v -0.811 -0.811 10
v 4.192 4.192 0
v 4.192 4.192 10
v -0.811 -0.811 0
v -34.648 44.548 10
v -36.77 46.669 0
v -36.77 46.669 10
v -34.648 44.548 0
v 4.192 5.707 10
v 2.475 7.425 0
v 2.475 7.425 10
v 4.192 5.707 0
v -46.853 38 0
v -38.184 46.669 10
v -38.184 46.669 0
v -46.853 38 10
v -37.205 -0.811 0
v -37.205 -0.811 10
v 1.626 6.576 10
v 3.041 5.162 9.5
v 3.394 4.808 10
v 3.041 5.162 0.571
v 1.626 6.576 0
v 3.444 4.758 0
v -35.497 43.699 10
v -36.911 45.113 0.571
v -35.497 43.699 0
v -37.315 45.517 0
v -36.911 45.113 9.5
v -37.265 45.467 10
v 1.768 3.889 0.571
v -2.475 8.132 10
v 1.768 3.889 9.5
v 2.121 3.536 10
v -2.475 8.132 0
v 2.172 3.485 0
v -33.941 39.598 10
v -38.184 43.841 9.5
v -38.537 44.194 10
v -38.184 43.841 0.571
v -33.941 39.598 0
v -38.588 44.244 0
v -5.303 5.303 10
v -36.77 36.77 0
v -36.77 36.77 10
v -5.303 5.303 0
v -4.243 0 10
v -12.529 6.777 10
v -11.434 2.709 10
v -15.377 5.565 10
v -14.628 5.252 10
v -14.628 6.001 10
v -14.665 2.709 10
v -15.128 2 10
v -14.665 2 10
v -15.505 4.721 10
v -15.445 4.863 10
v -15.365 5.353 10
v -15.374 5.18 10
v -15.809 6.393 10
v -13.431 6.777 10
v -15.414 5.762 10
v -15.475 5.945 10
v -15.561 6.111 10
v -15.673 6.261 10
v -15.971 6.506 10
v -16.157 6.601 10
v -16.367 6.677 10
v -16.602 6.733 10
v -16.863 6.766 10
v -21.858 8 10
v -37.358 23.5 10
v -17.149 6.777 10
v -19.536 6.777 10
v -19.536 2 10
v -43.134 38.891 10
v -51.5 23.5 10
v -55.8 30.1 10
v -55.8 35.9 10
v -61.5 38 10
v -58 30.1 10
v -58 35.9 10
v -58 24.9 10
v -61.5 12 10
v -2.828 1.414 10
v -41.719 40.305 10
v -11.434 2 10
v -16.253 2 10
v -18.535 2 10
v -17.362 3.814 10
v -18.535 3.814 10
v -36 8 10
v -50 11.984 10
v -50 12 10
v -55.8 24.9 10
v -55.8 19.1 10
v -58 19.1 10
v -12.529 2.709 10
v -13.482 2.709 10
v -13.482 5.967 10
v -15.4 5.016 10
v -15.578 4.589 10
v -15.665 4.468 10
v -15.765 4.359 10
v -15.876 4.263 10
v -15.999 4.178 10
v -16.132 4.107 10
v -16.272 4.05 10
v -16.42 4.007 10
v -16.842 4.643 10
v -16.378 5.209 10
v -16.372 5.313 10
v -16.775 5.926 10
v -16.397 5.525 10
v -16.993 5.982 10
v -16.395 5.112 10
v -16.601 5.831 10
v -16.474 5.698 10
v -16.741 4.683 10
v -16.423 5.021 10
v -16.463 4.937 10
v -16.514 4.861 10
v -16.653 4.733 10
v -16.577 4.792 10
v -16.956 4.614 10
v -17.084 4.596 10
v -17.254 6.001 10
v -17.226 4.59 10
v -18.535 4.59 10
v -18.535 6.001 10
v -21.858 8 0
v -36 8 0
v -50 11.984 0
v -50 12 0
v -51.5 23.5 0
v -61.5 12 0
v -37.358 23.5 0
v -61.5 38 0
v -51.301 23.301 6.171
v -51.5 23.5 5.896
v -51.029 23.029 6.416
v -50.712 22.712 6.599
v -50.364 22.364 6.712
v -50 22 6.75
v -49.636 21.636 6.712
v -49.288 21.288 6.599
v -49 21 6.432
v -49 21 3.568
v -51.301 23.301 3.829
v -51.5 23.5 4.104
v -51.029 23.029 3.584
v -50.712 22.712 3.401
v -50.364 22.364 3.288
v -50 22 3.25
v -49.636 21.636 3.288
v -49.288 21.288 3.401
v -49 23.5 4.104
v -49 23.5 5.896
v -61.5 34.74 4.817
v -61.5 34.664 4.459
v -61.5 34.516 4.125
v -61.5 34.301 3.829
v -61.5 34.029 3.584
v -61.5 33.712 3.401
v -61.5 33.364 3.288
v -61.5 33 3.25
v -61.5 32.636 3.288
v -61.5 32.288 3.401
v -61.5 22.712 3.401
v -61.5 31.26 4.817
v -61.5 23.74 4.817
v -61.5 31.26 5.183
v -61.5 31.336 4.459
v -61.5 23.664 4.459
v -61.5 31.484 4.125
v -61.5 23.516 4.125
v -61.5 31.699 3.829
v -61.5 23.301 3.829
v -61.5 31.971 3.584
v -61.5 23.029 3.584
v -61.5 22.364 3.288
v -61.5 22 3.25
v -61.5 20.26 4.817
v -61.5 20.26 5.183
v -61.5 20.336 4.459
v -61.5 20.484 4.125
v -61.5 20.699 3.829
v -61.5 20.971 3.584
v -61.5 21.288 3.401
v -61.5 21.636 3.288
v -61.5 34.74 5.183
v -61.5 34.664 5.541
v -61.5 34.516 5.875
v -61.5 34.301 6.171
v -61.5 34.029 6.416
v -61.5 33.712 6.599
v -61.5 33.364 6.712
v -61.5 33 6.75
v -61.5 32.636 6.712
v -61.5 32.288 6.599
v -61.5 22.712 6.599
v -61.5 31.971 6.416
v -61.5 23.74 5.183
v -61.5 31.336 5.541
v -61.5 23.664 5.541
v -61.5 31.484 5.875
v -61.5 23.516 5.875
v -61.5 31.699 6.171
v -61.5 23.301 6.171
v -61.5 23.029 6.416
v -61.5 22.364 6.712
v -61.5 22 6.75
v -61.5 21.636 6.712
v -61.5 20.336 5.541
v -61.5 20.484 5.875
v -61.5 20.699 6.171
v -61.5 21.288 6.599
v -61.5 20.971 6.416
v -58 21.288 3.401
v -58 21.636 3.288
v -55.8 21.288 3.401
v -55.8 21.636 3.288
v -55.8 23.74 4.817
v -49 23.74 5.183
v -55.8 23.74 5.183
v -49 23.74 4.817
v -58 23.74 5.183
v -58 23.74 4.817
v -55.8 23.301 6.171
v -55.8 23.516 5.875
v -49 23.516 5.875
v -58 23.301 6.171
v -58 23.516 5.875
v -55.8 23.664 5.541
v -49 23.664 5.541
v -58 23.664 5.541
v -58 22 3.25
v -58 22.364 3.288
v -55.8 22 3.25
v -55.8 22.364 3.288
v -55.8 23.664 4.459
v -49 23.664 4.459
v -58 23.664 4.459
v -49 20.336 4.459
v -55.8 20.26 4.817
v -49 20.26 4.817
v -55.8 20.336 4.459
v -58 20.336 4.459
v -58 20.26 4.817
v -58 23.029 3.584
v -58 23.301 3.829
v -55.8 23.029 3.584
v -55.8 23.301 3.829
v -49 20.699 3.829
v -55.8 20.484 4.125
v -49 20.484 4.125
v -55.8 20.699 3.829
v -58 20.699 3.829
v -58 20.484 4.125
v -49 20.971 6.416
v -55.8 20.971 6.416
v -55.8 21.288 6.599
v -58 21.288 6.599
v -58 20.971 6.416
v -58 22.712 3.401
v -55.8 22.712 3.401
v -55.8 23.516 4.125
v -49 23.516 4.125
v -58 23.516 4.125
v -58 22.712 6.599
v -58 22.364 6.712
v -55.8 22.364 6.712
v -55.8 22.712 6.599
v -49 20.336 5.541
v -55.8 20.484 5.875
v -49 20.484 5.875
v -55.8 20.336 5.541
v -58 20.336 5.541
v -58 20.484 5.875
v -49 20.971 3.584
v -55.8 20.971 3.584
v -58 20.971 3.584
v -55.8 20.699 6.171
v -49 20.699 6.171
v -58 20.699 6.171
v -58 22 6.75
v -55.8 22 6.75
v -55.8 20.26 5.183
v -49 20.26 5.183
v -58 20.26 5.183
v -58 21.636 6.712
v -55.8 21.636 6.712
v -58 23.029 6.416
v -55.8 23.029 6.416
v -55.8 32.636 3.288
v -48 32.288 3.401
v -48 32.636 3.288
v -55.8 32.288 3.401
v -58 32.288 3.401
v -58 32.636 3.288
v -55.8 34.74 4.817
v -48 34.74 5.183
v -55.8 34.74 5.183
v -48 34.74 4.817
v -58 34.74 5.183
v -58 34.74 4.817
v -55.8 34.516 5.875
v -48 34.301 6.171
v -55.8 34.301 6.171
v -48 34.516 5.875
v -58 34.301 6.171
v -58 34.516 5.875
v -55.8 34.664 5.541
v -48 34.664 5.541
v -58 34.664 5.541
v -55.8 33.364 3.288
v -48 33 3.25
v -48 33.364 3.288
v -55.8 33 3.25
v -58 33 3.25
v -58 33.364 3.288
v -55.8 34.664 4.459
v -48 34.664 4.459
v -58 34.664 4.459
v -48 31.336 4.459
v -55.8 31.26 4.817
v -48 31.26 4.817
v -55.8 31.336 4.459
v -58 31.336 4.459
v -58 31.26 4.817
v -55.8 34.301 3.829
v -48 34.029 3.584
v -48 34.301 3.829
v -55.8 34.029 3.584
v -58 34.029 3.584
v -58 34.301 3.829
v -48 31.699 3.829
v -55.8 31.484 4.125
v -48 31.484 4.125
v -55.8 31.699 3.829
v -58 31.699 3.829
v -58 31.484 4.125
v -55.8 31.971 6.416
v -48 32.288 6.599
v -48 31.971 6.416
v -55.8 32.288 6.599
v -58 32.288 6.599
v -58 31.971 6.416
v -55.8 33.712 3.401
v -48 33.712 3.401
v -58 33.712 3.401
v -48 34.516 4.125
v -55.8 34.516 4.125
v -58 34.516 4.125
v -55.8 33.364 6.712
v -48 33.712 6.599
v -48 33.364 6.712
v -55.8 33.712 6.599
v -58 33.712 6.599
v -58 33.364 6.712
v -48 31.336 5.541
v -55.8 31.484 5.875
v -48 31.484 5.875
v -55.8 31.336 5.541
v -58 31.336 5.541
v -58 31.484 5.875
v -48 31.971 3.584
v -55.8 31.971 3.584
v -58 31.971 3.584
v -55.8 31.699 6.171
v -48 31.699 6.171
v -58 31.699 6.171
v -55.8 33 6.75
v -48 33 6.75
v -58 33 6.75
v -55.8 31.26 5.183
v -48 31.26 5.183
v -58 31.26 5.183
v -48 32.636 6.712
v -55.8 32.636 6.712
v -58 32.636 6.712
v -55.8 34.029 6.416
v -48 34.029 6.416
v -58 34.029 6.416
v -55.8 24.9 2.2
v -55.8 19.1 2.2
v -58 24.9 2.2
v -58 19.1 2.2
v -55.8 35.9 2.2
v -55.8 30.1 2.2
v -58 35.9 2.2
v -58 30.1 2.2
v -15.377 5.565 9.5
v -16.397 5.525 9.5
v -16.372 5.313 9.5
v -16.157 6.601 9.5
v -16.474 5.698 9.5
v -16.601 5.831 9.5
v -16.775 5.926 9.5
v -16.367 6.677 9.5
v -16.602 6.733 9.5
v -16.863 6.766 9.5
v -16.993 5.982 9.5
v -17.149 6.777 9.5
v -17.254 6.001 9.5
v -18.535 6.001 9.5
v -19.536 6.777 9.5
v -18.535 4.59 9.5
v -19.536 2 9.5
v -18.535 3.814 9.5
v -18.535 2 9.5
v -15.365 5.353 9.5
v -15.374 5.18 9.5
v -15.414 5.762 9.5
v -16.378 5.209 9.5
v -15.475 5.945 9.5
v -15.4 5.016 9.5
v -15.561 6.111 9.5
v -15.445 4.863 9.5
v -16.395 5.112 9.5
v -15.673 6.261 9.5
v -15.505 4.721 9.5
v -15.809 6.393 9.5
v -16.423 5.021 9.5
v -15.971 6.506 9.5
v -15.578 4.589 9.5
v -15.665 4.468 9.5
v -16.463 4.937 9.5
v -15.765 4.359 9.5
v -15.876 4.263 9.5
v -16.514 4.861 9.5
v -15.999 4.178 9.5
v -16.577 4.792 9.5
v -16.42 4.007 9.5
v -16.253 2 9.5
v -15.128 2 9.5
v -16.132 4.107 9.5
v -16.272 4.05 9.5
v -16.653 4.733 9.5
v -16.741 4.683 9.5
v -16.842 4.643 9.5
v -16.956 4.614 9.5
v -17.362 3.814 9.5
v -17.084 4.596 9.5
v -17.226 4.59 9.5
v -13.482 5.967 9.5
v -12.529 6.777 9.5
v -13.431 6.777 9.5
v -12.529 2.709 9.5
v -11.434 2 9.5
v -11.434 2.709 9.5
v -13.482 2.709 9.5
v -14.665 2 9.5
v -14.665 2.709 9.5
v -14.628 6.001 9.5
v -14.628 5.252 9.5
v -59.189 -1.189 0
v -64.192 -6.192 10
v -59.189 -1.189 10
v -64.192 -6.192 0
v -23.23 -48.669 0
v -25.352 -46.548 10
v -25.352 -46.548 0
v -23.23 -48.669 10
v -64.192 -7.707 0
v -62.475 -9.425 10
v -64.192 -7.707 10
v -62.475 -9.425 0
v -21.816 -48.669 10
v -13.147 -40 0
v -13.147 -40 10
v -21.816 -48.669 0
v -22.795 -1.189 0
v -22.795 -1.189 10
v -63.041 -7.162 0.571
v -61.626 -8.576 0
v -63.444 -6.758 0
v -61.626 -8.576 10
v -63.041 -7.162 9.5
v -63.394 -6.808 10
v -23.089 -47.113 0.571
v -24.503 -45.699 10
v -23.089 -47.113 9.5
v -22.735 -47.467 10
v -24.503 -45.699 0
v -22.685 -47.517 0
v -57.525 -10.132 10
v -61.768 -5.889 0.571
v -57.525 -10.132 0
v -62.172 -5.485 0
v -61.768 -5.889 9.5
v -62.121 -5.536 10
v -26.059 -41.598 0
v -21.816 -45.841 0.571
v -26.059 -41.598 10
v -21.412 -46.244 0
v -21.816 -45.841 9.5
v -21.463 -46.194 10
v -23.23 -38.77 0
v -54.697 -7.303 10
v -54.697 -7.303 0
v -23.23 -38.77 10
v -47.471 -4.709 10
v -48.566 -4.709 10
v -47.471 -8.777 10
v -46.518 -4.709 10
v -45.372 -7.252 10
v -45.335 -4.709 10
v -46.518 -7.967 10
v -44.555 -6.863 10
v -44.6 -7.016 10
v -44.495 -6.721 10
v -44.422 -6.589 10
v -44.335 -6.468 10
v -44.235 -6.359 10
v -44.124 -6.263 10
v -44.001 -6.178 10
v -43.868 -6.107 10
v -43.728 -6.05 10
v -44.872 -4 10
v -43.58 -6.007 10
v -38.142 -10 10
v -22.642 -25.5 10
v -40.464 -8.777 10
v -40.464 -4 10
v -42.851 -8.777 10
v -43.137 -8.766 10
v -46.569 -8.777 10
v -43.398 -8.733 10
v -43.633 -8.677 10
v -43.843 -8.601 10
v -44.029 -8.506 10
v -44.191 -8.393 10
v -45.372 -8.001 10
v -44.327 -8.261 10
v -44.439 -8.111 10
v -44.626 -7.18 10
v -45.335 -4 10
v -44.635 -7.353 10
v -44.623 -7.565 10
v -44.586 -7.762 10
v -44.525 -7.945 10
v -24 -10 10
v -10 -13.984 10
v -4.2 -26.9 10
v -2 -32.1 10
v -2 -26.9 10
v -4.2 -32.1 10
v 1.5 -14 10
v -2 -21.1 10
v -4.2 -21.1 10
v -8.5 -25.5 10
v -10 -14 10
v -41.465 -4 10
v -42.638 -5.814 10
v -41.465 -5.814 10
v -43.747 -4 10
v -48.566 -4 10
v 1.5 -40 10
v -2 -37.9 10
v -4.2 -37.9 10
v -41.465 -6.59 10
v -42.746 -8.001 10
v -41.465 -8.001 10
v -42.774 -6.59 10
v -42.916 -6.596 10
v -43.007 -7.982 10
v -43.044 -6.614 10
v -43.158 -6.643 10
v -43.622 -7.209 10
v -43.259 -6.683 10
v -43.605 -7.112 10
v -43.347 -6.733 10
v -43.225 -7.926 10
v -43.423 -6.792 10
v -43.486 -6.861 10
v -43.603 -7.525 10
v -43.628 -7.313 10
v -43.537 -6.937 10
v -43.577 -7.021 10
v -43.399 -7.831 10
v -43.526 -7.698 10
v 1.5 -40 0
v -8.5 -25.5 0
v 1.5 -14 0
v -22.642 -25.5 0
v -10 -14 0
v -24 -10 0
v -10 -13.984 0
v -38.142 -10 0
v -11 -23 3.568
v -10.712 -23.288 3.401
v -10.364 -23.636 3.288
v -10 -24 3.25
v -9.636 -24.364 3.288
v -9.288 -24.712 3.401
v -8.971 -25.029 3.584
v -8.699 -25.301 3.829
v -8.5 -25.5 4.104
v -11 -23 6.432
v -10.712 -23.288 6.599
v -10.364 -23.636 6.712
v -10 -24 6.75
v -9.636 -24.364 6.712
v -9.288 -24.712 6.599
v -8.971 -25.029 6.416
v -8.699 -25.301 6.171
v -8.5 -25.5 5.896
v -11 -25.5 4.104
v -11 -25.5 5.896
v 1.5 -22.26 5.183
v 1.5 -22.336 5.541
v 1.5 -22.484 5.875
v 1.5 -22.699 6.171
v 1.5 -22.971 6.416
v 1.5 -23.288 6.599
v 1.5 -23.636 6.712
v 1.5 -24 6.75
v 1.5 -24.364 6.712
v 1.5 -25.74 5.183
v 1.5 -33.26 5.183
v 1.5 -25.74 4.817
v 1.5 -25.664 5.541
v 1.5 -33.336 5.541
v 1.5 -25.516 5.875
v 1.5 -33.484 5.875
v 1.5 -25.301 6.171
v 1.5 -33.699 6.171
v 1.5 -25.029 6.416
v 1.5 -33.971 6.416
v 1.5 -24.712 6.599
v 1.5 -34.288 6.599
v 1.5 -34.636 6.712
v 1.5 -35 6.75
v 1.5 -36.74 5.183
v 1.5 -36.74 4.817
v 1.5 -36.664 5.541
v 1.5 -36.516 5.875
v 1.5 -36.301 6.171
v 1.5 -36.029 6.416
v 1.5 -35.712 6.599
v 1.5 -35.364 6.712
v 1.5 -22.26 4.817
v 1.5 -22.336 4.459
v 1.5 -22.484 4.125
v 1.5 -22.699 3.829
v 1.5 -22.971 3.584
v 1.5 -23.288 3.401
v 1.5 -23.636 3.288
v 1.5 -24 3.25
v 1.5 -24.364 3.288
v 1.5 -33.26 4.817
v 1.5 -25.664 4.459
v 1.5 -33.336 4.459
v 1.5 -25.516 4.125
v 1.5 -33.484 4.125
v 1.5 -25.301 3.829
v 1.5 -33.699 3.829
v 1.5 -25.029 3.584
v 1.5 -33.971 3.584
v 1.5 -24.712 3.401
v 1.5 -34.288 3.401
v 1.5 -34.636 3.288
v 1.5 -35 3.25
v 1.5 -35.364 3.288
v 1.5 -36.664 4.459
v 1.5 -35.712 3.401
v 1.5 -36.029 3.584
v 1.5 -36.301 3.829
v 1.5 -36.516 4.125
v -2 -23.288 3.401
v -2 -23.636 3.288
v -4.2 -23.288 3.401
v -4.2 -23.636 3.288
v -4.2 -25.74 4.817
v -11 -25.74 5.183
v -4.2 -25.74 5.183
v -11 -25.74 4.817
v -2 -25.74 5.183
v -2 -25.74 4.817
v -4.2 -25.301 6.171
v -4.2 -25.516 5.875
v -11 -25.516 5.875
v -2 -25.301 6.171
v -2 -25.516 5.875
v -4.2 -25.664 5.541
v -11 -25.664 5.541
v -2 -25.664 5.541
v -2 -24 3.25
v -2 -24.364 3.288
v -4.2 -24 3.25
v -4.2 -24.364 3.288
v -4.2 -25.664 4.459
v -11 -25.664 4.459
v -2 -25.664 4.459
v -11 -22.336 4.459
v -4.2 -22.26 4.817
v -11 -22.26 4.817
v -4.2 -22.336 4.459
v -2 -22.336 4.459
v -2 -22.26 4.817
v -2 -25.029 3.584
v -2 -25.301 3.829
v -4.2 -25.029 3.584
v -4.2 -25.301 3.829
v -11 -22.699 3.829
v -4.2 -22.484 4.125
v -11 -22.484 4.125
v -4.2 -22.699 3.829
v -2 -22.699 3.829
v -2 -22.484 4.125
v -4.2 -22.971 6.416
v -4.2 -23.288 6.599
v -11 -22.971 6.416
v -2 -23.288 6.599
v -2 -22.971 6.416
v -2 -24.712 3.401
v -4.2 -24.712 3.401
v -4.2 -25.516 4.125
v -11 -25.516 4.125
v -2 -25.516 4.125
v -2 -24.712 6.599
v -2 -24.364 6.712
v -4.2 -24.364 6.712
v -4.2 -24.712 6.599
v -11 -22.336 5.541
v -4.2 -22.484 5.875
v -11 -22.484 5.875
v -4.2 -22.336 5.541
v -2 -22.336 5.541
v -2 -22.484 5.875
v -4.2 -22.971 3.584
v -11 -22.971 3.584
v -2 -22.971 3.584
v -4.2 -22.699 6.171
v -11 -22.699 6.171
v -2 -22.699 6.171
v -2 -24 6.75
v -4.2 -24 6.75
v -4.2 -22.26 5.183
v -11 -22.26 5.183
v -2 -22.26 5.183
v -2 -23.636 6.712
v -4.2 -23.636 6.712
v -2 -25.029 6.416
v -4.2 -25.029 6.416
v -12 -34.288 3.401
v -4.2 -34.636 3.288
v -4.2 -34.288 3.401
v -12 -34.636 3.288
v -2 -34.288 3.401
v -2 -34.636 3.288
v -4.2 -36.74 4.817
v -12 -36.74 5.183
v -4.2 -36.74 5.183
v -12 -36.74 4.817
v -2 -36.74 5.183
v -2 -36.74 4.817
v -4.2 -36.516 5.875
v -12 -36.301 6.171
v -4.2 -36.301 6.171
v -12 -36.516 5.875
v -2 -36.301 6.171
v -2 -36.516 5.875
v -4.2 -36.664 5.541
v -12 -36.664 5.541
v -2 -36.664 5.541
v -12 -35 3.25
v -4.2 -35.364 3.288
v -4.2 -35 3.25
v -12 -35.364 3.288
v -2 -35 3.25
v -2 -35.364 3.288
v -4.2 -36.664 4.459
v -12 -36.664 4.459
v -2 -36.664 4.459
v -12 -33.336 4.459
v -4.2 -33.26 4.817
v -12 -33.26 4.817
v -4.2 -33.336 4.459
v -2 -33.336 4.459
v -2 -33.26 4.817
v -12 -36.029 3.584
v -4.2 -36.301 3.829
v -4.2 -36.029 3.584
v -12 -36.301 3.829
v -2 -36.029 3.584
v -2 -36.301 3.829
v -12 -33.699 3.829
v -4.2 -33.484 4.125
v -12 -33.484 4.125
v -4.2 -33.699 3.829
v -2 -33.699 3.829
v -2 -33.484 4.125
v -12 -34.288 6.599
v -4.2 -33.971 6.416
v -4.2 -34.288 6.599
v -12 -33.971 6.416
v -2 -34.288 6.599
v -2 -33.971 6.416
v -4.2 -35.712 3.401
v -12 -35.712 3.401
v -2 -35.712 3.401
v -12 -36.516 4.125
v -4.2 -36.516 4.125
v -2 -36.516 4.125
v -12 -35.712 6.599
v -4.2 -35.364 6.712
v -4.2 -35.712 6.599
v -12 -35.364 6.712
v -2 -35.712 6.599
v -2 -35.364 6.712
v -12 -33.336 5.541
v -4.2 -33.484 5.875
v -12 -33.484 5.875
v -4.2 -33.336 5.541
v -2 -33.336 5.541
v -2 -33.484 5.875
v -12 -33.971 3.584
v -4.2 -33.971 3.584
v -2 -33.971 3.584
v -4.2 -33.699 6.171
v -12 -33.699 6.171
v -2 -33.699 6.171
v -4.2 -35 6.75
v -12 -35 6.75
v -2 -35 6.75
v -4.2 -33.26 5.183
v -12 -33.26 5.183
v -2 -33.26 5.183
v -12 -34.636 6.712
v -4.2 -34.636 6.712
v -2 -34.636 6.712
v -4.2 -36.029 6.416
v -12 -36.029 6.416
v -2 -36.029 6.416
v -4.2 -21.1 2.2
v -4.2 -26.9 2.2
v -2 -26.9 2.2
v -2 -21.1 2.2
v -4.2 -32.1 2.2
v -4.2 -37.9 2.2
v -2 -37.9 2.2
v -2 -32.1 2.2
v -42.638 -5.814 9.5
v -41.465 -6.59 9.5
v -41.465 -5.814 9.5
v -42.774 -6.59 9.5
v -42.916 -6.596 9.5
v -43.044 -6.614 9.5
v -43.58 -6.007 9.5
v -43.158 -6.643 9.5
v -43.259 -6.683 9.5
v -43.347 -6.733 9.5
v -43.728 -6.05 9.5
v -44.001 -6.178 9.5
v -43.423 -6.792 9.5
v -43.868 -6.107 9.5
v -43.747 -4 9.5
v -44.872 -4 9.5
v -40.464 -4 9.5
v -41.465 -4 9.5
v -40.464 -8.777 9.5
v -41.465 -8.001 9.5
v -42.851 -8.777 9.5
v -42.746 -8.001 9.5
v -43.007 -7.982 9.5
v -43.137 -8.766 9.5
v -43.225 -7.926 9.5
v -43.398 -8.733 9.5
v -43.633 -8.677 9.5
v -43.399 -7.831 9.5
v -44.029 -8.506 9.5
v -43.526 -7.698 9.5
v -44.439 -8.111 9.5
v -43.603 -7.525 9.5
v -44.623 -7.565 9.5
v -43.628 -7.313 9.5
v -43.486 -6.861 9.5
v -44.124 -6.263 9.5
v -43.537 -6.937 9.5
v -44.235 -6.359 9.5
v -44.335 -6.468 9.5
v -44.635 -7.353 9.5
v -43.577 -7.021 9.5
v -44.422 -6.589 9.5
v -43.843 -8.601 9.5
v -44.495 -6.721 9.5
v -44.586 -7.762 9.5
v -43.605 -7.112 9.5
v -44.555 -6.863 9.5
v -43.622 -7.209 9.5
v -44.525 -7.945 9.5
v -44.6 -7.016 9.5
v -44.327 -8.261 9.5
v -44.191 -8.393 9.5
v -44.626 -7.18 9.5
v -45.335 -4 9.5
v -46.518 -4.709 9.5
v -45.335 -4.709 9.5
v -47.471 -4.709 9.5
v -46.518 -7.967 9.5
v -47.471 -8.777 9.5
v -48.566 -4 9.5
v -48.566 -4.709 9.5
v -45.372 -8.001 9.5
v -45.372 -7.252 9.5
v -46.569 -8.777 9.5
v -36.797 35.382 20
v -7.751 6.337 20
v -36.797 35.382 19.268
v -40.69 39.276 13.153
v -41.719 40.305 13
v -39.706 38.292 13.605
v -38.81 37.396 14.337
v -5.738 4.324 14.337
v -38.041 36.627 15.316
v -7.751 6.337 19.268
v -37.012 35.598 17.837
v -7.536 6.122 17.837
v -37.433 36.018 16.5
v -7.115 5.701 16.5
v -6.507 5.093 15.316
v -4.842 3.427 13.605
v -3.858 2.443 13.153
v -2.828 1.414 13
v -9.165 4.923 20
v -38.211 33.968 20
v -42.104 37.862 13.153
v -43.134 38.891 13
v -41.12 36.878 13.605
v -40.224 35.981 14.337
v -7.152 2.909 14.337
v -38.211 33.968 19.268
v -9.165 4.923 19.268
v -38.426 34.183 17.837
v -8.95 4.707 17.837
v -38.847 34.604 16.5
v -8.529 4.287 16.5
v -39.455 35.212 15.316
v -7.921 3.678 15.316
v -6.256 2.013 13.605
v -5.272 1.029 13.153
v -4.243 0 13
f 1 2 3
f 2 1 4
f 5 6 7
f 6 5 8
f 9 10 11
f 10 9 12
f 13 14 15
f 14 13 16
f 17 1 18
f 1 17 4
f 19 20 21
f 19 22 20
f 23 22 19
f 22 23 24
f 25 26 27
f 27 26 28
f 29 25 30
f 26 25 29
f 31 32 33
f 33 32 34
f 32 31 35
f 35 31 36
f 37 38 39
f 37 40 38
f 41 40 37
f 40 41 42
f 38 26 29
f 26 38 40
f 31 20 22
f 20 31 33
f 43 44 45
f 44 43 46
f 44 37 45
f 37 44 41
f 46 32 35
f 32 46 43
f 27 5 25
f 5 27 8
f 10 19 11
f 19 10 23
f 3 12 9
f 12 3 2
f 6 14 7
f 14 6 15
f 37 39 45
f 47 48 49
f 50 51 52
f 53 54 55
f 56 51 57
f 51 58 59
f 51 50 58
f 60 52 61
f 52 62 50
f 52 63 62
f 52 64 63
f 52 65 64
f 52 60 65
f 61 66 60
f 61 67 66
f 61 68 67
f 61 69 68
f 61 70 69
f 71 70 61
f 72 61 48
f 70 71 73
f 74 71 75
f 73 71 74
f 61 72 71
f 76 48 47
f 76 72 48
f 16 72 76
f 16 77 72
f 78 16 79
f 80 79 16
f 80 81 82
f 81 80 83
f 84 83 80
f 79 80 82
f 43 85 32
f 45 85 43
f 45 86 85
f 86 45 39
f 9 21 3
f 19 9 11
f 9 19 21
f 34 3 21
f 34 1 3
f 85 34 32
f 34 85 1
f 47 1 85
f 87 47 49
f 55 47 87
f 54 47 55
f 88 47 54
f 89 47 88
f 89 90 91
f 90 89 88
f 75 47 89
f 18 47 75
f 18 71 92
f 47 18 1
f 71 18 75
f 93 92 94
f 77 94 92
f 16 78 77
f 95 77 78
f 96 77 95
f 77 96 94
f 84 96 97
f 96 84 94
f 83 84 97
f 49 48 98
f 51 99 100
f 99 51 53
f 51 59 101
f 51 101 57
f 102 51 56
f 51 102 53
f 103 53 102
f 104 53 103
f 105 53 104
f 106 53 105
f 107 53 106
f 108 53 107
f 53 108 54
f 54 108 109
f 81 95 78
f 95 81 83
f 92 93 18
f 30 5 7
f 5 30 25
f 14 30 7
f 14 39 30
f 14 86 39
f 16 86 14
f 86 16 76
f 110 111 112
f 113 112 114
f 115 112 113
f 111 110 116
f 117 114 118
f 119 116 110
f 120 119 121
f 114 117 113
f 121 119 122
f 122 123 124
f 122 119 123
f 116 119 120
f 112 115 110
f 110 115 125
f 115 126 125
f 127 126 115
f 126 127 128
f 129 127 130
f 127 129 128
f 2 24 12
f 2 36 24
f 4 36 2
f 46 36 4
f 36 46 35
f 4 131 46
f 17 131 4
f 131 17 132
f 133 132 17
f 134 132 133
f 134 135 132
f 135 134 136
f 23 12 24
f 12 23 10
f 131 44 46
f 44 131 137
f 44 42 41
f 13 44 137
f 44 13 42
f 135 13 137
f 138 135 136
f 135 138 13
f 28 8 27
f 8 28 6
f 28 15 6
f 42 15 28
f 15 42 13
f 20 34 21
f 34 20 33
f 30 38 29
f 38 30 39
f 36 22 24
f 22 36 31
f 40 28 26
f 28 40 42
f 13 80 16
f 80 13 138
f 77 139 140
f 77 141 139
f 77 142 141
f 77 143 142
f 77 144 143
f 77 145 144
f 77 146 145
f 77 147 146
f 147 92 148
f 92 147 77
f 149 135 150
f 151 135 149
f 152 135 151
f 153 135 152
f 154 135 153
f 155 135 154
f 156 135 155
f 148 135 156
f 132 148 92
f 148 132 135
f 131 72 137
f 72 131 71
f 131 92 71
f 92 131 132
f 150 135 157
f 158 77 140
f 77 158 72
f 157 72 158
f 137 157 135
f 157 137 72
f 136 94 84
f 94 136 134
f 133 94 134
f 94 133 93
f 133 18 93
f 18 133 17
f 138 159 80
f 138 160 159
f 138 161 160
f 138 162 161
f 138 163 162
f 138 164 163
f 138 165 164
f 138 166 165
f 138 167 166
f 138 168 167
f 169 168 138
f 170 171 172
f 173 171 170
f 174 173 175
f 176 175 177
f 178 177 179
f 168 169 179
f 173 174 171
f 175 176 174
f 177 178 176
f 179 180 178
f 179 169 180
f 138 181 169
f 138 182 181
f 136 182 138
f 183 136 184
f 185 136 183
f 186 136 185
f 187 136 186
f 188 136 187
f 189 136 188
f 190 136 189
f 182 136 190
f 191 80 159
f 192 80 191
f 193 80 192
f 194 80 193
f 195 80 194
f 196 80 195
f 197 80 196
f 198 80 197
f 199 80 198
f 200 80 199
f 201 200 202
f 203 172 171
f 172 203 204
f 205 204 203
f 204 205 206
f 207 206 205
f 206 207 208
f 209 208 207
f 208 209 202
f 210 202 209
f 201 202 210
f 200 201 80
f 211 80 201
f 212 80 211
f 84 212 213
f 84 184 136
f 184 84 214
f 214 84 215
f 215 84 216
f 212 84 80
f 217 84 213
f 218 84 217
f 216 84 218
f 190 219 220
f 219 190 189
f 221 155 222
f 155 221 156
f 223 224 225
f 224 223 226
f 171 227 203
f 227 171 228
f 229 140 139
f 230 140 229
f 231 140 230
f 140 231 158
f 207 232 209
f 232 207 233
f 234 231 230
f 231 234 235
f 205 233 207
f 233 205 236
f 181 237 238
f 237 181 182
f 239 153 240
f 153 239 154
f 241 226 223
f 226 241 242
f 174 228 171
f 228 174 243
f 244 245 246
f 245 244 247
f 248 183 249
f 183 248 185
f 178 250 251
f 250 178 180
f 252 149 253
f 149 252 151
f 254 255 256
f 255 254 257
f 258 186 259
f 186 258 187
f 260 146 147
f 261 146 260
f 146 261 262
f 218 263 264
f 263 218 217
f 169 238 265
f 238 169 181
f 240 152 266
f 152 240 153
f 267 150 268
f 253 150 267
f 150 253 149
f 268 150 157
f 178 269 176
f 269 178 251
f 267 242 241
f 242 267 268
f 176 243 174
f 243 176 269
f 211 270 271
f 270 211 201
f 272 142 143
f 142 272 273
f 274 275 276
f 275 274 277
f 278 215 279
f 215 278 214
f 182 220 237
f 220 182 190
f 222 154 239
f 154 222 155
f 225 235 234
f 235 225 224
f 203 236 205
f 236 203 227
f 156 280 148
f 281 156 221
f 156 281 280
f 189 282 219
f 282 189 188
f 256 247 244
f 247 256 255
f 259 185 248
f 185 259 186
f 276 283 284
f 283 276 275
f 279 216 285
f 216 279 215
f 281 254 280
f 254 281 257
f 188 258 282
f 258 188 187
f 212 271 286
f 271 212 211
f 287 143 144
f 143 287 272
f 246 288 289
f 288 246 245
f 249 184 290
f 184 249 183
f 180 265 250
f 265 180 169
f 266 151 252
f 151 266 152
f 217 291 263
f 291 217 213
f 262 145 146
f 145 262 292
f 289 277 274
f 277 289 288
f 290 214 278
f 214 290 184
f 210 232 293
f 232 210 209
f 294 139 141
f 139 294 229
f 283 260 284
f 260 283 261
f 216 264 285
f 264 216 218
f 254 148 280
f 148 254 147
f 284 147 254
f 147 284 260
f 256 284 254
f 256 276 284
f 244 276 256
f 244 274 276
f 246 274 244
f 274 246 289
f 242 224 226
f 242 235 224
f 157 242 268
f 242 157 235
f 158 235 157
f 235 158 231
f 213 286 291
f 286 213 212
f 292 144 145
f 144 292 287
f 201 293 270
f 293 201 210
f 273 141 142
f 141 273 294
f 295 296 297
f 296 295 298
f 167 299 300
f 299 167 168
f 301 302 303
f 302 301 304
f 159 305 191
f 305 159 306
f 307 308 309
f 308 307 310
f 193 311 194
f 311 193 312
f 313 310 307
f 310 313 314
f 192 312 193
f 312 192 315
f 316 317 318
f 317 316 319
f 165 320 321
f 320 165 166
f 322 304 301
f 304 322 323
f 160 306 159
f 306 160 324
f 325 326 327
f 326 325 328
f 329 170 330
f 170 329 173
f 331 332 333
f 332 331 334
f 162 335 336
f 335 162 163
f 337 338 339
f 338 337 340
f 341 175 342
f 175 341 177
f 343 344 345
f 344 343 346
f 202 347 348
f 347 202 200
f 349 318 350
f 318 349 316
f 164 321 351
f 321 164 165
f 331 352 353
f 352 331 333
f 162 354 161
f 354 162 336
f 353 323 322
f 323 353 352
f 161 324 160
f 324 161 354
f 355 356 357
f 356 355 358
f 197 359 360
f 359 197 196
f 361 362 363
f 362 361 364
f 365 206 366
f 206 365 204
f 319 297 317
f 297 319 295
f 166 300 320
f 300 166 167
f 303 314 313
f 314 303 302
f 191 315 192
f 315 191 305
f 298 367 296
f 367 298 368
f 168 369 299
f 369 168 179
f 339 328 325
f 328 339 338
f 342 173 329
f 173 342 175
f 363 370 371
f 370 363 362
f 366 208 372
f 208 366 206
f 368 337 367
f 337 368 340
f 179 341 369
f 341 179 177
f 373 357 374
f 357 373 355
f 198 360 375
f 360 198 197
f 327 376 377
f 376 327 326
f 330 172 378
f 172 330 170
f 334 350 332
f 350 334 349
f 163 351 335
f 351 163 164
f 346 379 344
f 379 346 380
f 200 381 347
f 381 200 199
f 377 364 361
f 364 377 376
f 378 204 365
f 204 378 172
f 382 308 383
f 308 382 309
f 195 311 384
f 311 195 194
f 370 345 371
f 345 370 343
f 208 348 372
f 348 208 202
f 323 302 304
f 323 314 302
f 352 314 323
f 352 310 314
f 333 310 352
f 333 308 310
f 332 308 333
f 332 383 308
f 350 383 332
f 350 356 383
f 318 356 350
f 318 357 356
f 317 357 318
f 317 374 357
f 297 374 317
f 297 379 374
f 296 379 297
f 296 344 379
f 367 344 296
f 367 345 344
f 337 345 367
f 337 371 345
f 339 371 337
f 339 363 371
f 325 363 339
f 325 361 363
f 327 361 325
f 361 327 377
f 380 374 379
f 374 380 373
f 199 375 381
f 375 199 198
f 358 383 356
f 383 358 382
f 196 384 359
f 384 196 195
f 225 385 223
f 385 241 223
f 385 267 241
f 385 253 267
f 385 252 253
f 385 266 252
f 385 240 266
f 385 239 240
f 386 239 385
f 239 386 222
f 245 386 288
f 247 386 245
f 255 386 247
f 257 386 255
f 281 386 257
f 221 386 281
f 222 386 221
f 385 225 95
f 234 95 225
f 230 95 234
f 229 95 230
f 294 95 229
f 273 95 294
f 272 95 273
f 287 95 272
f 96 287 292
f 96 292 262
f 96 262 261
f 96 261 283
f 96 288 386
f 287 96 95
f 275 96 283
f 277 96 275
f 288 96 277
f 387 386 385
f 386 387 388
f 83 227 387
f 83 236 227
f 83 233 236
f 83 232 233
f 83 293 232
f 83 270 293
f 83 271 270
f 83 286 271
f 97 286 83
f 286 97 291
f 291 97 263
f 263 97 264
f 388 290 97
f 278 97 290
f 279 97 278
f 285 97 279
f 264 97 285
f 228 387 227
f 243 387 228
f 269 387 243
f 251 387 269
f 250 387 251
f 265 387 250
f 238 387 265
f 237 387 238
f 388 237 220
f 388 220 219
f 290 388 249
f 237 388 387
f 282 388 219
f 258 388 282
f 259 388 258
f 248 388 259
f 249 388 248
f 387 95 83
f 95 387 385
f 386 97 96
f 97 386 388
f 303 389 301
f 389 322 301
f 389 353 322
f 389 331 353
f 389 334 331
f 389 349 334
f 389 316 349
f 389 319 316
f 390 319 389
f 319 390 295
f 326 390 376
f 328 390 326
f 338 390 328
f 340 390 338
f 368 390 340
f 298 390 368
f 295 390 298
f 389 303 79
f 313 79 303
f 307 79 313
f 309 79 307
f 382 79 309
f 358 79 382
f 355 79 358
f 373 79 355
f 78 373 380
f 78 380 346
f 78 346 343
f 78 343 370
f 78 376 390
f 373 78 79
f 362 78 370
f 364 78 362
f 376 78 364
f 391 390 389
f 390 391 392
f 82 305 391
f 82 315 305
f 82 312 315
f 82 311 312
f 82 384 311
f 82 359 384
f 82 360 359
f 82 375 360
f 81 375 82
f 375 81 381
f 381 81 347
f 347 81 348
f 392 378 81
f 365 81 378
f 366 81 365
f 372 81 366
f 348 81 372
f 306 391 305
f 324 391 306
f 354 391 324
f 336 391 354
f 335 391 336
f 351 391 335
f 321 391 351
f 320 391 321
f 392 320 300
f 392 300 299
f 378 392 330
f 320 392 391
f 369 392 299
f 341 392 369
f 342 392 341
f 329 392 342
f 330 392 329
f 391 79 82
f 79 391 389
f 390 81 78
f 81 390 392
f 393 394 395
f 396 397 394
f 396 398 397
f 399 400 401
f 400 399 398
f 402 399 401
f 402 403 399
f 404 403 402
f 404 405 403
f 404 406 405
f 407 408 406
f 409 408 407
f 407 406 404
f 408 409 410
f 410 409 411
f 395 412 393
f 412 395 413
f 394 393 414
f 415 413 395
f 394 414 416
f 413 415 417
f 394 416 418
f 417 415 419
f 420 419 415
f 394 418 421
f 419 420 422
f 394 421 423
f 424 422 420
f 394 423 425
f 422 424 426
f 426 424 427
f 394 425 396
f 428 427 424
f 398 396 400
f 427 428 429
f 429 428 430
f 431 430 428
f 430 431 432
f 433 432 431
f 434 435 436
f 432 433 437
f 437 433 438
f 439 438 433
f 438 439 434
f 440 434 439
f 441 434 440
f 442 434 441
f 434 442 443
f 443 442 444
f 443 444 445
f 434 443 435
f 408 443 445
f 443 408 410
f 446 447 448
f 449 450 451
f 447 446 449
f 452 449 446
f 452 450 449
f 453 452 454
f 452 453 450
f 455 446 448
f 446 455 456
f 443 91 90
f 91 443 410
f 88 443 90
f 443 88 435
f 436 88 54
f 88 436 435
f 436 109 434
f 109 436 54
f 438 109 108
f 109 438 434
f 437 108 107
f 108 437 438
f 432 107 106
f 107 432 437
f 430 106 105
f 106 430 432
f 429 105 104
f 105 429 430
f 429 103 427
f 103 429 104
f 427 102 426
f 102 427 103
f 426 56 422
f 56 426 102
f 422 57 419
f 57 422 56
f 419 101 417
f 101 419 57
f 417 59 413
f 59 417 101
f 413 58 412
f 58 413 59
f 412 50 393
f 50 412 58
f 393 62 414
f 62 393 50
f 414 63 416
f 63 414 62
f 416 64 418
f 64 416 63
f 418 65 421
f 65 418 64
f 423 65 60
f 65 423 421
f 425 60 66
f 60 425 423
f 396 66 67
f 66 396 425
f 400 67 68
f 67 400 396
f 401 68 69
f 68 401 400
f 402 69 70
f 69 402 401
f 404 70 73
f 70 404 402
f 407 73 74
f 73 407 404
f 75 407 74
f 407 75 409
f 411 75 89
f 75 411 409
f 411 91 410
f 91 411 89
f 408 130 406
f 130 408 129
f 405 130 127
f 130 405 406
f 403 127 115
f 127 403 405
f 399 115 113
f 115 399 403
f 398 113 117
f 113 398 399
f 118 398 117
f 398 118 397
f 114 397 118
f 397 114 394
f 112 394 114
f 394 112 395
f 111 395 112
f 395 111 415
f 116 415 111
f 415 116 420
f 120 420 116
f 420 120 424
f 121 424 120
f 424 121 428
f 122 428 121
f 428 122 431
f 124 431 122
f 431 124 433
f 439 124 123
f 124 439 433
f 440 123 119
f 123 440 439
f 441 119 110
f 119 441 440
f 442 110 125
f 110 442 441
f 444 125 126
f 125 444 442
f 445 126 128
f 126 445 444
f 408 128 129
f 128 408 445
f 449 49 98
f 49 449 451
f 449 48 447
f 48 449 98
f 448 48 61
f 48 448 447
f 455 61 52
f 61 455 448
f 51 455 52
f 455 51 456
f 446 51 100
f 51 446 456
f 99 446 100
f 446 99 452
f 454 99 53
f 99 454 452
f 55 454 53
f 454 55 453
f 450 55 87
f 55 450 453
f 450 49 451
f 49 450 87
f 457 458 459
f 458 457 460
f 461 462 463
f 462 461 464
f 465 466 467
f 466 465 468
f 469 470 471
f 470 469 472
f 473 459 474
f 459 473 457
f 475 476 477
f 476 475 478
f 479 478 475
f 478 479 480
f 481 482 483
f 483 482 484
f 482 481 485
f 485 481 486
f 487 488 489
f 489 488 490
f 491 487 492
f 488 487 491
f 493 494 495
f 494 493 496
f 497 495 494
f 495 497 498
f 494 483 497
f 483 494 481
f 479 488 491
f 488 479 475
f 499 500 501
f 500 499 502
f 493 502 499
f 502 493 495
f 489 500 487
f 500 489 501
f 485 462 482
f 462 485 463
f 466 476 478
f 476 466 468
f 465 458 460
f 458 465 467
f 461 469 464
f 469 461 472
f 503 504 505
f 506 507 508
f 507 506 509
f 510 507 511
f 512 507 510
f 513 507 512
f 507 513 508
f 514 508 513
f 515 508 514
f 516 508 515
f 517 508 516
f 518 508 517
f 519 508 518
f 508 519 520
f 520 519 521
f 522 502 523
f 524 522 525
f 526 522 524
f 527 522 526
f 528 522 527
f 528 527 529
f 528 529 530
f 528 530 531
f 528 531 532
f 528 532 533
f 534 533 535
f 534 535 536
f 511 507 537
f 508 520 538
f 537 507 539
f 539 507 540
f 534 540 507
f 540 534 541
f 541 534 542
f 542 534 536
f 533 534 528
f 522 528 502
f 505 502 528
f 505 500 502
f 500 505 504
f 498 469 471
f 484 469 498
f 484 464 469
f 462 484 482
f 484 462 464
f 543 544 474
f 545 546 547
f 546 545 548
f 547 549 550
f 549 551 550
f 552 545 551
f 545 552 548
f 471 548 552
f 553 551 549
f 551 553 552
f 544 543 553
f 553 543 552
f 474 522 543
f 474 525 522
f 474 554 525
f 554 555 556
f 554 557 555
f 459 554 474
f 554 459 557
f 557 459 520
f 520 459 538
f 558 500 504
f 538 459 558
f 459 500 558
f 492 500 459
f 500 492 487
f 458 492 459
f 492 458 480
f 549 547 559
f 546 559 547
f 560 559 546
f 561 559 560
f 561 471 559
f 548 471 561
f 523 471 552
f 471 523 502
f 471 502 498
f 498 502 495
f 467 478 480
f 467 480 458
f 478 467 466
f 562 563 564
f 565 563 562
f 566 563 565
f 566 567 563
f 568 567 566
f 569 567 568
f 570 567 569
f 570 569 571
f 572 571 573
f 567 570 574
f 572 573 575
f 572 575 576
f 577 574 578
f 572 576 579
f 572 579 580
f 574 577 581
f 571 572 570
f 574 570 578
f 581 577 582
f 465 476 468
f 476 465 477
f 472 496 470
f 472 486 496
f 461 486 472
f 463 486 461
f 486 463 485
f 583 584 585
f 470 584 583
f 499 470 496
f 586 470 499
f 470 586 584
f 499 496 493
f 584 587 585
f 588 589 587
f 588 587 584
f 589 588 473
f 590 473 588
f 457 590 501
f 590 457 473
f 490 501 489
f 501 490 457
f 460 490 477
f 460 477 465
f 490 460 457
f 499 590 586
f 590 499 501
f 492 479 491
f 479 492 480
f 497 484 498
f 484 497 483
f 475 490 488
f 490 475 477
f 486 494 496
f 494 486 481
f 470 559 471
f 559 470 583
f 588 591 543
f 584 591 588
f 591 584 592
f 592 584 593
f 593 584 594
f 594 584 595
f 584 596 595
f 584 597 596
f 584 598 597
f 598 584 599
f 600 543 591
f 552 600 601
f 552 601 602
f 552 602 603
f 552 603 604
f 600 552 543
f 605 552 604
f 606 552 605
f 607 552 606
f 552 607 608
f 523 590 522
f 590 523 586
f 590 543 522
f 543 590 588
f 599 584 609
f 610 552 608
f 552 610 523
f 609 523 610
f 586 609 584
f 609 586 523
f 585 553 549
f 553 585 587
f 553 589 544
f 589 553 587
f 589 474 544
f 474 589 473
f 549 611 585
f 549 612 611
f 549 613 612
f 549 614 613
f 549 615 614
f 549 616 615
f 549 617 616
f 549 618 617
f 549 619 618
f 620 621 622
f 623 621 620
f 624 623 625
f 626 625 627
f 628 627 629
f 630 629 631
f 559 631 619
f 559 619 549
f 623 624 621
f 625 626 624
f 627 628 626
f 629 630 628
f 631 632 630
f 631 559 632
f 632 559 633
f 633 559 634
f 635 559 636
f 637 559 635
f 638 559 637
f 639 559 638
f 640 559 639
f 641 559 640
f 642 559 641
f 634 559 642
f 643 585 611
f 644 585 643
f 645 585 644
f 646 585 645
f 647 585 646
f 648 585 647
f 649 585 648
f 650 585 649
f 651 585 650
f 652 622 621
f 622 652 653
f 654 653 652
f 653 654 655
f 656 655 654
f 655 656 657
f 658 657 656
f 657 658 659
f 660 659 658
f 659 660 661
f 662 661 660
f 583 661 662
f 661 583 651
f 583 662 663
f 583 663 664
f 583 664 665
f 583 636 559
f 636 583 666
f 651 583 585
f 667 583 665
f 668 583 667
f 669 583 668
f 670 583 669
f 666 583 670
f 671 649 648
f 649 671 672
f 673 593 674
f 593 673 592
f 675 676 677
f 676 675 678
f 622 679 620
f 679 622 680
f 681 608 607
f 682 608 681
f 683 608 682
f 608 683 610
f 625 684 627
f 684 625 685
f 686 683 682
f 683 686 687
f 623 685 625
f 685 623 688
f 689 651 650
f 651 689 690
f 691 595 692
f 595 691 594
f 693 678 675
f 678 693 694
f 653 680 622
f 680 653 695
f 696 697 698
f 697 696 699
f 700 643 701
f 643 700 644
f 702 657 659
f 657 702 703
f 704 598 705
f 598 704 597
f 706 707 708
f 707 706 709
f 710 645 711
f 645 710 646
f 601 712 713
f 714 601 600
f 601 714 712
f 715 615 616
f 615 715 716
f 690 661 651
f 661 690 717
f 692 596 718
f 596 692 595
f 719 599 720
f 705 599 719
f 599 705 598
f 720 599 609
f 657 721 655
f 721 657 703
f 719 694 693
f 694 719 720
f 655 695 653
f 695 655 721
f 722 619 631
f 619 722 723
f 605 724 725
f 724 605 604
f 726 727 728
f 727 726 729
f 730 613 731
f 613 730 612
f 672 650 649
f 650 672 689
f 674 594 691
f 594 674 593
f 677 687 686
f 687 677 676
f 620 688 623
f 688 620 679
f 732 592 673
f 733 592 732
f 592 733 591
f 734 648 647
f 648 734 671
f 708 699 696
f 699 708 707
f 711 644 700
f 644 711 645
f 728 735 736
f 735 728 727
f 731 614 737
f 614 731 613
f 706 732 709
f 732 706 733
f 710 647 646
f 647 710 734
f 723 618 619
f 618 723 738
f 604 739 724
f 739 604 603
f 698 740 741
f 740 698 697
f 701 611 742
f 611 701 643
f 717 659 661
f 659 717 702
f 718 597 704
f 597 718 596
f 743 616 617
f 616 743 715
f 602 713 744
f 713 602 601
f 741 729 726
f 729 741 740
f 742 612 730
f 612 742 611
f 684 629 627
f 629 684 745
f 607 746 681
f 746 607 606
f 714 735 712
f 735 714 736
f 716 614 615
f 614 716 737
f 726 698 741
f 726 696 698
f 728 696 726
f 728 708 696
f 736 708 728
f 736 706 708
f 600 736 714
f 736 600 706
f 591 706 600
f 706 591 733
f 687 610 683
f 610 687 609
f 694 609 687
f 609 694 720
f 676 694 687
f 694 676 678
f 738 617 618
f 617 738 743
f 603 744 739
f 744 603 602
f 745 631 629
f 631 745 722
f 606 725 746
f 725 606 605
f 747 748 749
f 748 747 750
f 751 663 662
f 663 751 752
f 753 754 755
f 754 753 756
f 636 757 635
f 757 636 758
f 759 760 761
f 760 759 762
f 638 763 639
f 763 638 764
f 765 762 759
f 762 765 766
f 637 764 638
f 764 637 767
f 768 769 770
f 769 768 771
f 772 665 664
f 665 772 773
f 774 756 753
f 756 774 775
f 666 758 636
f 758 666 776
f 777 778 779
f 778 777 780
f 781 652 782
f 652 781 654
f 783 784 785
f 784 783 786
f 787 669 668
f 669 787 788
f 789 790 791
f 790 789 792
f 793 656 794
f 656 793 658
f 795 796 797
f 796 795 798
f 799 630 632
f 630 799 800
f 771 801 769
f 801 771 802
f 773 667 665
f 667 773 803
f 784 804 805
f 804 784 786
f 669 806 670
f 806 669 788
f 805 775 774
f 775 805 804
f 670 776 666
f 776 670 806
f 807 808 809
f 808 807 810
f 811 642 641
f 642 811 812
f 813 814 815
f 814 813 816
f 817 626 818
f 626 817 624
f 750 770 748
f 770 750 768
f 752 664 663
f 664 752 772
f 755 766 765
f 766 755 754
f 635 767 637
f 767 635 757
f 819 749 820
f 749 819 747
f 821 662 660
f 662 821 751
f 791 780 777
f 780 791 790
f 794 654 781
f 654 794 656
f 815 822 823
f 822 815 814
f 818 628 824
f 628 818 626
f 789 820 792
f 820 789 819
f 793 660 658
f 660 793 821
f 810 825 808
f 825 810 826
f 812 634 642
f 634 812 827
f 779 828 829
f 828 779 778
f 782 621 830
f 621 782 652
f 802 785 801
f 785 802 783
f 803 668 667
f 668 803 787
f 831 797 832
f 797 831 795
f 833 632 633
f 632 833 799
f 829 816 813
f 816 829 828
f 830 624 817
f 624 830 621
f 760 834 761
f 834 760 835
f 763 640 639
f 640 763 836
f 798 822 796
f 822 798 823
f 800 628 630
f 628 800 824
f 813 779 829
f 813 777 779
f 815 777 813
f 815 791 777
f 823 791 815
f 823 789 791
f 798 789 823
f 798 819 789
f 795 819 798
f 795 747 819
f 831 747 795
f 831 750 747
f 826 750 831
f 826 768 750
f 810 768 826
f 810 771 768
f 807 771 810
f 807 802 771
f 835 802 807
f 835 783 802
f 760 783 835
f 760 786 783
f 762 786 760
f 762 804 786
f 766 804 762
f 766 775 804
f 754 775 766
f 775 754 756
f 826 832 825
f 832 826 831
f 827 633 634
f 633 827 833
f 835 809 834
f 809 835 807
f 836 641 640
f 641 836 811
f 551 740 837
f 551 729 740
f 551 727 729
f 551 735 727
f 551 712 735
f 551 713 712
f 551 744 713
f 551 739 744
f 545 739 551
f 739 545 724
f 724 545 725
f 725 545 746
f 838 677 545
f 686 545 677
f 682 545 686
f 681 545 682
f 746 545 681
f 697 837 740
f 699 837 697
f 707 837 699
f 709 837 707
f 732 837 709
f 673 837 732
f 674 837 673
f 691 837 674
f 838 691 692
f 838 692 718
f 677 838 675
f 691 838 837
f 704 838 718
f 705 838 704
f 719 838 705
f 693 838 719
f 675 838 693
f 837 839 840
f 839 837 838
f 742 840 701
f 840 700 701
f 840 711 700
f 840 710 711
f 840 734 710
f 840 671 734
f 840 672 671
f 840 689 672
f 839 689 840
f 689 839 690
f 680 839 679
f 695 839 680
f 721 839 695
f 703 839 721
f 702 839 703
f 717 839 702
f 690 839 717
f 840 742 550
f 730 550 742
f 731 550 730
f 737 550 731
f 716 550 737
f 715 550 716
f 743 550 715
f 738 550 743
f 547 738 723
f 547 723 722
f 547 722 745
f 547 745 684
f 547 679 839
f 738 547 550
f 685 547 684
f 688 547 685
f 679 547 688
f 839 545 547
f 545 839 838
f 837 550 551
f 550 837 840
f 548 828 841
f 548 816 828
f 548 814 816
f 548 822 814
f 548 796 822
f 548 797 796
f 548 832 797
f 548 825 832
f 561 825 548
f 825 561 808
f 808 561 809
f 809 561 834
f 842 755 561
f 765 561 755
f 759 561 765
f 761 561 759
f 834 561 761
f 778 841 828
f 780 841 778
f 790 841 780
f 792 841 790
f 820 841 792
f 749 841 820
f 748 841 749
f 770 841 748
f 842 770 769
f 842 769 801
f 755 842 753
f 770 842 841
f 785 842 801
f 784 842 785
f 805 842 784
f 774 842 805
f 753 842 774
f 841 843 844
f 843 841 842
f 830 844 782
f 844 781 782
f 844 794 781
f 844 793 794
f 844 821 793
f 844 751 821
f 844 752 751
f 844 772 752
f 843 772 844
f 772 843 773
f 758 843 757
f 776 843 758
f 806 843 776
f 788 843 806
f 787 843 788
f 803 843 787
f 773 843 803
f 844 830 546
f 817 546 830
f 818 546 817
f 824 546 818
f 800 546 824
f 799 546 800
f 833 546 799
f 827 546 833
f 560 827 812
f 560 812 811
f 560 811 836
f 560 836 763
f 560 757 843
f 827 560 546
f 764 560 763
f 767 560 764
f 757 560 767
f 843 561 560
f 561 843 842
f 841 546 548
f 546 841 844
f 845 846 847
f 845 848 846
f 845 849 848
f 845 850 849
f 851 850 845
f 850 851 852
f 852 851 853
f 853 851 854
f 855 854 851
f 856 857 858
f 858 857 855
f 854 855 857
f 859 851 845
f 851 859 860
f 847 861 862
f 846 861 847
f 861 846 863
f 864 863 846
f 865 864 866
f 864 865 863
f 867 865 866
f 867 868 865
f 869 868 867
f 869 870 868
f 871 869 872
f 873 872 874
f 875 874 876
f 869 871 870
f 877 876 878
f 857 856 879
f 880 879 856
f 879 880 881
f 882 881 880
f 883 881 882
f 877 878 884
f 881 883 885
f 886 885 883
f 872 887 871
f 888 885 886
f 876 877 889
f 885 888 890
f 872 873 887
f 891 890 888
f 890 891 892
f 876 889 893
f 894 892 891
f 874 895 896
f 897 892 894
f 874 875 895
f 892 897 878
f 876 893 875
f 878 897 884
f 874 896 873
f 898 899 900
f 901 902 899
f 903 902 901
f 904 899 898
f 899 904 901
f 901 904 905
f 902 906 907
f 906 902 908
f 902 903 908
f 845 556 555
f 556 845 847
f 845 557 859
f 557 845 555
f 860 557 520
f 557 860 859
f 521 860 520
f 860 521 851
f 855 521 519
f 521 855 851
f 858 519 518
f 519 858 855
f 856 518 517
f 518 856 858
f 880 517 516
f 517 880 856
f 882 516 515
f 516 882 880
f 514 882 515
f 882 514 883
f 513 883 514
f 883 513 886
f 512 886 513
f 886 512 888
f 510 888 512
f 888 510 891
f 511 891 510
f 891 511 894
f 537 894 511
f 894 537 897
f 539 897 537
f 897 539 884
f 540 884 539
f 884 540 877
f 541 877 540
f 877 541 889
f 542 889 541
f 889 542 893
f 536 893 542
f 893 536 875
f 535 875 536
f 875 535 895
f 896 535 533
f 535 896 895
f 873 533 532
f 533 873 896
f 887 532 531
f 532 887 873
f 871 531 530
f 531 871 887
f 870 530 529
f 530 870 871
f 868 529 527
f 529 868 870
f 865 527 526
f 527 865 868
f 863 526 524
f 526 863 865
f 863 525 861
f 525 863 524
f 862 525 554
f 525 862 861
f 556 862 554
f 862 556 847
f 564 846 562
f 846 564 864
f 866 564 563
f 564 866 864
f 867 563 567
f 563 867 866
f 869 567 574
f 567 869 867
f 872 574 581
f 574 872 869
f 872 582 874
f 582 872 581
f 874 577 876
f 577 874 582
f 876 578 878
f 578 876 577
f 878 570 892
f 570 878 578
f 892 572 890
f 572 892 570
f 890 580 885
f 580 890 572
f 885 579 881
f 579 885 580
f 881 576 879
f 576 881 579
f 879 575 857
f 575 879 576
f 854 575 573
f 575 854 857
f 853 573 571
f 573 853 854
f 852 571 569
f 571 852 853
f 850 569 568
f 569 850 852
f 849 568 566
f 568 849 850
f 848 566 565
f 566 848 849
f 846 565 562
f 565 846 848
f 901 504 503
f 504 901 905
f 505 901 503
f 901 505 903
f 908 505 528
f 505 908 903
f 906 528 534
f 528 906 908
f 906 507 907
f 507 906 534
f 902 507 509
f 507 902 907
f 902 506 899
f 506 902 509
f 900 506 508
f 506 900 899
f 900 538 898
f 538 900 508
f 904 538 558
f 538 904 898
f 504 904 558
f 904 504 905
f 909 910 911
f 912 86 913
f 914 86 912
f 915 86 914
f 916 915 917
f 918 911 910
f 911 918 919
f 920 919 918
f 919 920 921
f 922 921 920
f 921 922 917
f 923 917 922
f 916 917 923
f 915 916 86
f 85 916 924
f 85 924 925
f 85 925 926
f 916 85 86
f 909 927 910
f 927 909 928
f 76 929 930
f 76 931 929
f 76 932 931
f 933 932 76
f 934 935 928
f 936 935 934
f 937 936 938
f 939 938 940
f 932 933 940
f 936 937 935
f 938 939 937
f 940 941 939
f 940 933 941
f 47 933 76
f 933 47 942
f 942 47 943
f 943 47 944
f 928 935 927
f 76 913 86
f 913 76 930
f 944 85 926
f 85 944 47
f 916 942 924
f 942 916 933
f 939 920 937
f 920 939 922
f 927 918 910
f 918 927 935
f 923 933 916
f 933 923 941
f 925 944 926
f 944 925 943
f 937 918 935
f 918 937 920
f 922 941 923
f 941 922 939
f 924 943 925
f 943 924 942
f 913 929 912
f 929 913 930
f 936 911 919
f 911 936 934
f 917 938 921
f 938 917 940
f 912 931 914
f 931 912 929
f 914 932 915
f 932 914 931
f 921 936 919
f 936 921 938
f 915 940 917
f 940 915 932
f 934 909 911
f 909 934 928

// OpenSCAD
// PRUSA iteration4
// lcd supports
// GNU GPL v3
// Josef Průša <iam@josefprusa.cz> and contributors
// http://www.reprap.org/wiki/Prusa_Mendel
// http://prusamendel.org




module body()
{

    difference() 
        {
        // base block
        translate([-55,-2,0]) cube([69,81,10]); 

            union ()
            {
                // outer body shape
                translate([-69.6,32,-1]) rotate([0,0,45]) cube([60,53,15]); 
                translate([13.7,89.7,-1]) rotate([0,0,135]) cube([60,42,15]);
                translate([-19,-9,-1]) cube([60,9,15] );   
                translate([7,-3,-1]) cube([60,68,16]);  
                translate([-16,60,-1]) cube([60,50,15] );
                translate([-41, -45,-1]) rotate([0,0,45]) cube([60,80,13]);  
                
                // pcb cout out
                translate([4,1.5,-1]) cube([1.8,56.5,17]); 
                translate([0,7.5,-1]) cube([5.8,44.5,17]); 
                translate([4.8,3.5,-1]) cube([5.8,52.5,17]);
                translate([8,-5,-1] ) rotate([0,0,45]) cube([5,5,17]);
                translate([8,58,-1]) rotate([0,0,45]) cube([5,5,17]);
            }

            // pcb inserts
            translate([4,3,8]) rotate([45,0,0]) cube([1.8,5,5]); 
            translate([4,56.5,8]) rotate([45,0,0]) cube([1.8,5,5]);     
            translate([4,3,-5]) rotate([45,0,0]) cube([1.8,5,5]); 
            translate([4,56.5,-5]) rotate([45,0,0]) cube([1.8,5,5]);     
        }
}



module support()
{
    difference() 
    {
    
        union()
        {
            rotate([0,0,45]) body();
            // screw block
            translate([-72,22,0])  cube([30,16,10]);    
        }
        
        // lower angled part cut
        translate([-75,-2,-1])  cube([20,14,15]);    
        translate([-70,-2,-1]) cube([20,14,15]);    
        translate([-50,-16.3,-1]) rotate([0,0,45]) cube([20,20,15]);    
        
        translate([-76.5,-2,-1]) cube([15,40,15]);    
        
        difference()
        {
            translate([-28,0,-1]) rotate([0,0,45]) cube([10,40,15]);    
            translate([-38,-12,-1]) cube([20,20,15]);    
            translate([-58,23.5,-1]) cube([25,25,15]);    
        }
        
        // screw holes
        translate([-71,18+4,5]) rotate([0,90,0]) cylinder(h=22, r=1.75, $fn=30);  
        translate([-70,29+4,5]) rotate([0,90,0]) cylinder(h=22, r=1.75, $fn=30);  
        
        // nut traps
        translate([-58,15.1+4,5-2.8]) cube([2.2,5.8,29.7]);    
        translate([-58,26.1+4,5-2.8]) cube([2.2,5.8,29.7]); 
     
        // version
        translate([-20,2,9.5]) rotate([0,0,0]) linear_extrude(height = 0.6) 
        { text("R1",font = "helvetica:style=Bold", size=5, center=true); }   
    }
}


module left_lcd_support()
{
    support();
     
    rotate([0,0,45]) difference()
    {
        // sd card shield
        translate([-3,3,10])  cube([2,55,10]); 
        translate([-4,3,20]) rotate([0,90,0]) cylinder( h=4, r=7, $fn=30); 
        translate([-4,58,20]) rotate([0,90,0]) cylinder( h=4, r=7, $fn=30); 
    }
}

translate([-60,-2,0]) rotate([0,0,180]) support();
left_lcd_support();

 
